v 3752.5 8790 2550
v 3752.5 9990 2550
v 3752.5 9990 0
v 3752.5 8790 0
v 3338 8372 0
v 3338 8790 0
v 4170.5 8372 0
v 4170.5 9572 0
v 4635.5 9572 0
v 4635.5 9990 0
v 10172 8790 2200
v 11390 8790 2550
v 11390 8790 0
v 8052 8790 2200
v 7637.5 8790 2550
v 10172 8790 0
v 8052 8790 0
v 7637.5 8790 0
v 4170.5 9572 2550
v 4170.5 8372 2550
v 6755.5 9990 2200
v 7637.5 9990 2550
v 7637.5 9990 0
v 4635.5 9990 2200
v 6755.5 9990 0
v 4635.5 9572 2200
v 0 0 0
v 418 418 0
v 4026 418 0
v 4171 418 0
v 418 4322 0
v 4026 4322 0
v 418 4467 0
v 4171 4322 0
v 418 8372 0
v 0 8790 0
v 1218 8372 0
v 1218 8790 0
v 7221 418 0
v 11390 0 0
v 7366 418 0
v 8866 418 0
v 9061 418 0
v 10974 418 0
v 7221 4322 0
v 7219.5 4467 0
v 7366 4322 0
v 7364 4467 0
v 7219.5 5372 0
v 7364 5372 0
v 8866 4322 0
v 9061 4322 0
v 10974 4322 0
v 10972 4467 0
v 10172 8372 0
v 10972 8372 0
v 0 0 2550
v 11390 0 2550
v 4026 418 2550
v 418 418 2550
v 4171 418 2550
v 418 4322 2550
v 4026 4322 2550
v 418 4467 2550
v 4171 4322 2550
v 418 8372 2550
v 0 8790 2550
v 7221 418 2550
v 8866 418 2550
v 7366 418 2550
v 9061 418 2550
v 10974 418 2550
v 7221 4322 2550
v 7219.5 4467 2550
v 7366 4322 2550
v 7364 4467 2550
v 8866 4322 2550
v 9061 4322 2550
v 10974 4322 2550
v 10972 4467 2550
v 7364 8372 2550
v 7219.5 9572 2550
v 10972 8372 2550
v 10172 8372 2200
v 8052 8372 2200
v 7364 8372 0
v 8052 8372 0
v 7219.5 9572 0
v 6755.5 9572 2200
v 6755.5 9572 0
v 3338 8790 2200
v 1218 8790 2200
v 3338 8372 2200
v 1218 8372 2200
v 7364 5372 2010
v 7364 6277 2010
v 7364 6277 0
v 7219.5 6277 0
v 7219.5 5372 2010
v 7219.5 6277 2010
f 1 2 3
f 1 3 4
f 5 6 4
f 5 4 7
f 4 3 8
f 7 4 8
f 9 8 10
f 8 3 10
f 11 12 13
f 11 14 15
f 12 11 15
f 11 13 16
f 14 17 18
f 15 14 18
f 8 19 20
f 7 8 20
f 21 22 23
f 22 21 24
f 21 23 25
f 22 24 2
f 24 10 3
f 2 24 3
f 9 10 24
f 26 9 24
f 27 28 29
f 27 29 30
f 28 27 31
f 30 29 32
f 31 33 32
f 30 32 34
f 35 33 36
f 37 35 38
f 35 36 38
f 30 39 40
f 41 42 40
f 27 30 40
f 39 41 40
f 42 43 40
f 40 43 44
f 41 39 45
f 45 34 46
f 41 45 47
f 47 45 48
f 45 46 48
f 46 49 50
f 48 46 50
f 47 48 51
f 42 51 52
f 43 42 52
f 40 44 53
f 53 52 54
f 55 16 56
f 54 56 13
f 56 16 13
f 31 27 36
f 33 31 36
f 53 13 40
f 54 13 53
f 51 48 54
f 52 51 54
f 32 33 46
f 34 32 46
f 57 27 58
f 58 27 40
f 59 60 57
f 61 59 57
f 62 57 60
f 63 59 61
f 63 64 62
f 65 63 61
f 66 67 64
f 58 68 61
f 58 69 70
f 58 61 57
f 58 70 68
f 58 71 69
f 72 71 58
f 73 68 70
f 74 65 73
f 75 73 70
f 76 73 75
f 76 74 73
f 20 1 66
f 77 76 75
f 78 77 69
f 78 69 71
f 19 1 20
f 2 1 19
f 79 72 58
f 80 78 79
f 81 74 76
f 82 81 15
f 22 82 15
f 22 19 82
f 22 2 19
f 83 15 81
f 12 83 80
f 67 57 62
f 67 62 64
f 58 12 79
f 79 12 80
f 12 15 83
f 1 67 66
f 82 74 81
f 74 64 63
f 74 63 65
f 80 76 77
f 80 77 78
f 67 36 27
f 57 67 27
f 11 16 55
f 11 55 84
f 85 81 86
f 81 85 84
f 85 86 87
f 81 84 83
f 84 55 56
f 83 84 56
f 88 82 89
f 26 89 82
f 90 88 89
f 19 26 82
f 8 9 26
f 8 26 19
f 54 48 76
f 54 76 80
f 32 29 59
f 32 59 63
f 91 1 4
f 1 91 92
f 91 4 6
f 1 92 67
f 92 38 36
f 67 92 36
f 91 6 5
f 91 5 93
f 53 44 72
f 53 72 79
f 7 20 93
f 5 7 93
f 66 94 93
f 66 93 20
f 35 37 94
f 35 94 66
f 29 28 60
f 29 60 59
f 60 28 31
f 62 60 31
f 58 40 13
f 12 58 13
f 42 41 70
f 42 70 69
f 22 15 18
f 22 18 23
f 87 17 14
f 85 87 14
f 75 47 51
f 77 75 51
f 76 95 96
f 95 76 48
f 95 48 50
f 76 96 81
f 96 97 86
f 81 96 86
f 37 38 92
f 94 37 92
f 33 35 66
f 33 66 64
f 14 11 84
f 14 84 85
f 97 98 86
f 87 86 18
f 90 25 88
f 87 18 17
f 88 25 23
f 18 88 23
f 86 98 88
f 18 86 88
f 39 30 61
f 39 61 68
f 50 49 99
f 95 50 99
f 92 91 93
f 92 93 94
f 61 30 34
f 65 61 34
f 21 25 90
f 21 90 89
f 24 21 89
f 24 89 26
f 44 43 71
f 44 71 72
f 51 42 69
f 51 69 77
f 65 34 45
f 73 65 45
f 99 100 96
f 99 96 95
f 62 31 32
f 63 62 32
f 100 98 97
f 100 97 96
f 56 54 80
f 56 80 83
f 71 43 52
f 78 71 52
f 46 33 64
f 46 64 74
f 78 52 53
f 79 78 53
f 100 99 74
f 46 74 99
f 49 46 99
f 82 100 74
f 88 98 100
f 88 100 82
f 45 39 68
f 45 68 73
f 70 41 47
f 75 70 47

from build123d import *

# Parameters (mm, degrees)
F2_DEPTH  = 2550
F1_W      = 3608
F1_H      = 3905
F3_DEPTH  = 2550
F4_W      = 2120
F4_H      = 2200
F5_DEPTH  = 418
F6_W      = 2120
F6_H      = 2200
F7_DEPTH  = 418
F8_W      = 2120
F8_H      = 2200
F9_DEPTH  = 418
F10_W     = 905
F10_H     = 2010
F11_DEPTH = 144.5
F12_W     = 3608
F12_H     = 3904
F12_W_2   = 3050
F12_W_3   = 1500
F12_W_4   = 1913
F13_DEPTH = 2550.001


with BuildPart() as f2:
    # F0 (on Top) → F2 (new body)
    with BuildSketch(Plane.XY):
        Polygon((0, 8790), (0, 0), (11390, 0), (11390, 8790), (7637.5, 8790), (7637.5, 9990), (3752.5, 9990), (3752.5, 8790), align=None)
    extrude(amount=F2_DEPTH)

    # F1 (on face) → F3 (cut)
    with BuildSketch(Plane.XY):
        Polygon((4170.5, 8372), (418, 8372), (418, 4467), (7219.5, 4467), (7219.5, 9572), (4170.5, 9572), align=None)
        with Locations((9168, 6419.5)):
            Rectangle(F1_W, F1_H)
    extrude(amount=F3_DEPTH, mode=Mode.SUBTRACT)

    # F4 (on face) → F5 (cut)
    with BuildSketch(Plane(origin=(0, 8790, 0), x_dir=(-1, 0, 0), z_dir=(0, 1, 0))):
        with Locations((-9112, 1100)):
            Rectangle(F4_W, F4_H)
    extrude(amount=-F5_DEPTH, mode=Mode.SUBTRACT)

    # F6 (on face) → F7 (cut)
    with BuildSketch(Plane(origin=(0, 9990, 0), x_dir=(-1, 0, 0), z_dir=(0, 1, 0))):
        with Locations((-5695.5, 1100)):
            Rectangle(F6_W, F6_H)
    extrude(amount=-F7_DEPTH, mode=Mode.SUBTRACT)

    # F8 (on face) → F9 (cut)
    with BuildSketch(Plane(origin=(0, 8790, 0), x_dir=(-1, 0, 0), z_dir=(0, 1, 0))):
        with Locations((-2278, 1100)):
            Rectangle(F8_W, F8_H)
    extrude(amount=-F9_DEPTH, mode=Mode.SUBTRACT)

    # F10 (on face) → F11 (cut, through all)
    with BuildSketch(Plane(origin=(7219.5, 0, 0), x_dir=(0, -1, 0), z_dir=(-1, 0, 0))):
        with Locations((-5824.5, 1005)):
            Rectangle(F10_W, F10_H)
    extrude(amount=-F11_DEPTH, mode=Mode.SUBTRACT)

    # F12 (on Top) → F13 (cut, through all)
    with BuildSketch(Plane.XY):
        with Locations((2222, 2370)):
            Rectangle(F12_W, F12_H)
        with Locations((5696, 2370)):
            Rectangle(F12_W_2, F12_H)
        with Locations((8116, 2370)):
            Rectangle(F12_W_3, F12_H)
        with Locations((10017.5, 2370)):
            Rectangle(F12_W_4, F12_H)
    extrude(amount=F13_DEPTH, mode=Mode.SUBTRACT)


solid = f2.part
